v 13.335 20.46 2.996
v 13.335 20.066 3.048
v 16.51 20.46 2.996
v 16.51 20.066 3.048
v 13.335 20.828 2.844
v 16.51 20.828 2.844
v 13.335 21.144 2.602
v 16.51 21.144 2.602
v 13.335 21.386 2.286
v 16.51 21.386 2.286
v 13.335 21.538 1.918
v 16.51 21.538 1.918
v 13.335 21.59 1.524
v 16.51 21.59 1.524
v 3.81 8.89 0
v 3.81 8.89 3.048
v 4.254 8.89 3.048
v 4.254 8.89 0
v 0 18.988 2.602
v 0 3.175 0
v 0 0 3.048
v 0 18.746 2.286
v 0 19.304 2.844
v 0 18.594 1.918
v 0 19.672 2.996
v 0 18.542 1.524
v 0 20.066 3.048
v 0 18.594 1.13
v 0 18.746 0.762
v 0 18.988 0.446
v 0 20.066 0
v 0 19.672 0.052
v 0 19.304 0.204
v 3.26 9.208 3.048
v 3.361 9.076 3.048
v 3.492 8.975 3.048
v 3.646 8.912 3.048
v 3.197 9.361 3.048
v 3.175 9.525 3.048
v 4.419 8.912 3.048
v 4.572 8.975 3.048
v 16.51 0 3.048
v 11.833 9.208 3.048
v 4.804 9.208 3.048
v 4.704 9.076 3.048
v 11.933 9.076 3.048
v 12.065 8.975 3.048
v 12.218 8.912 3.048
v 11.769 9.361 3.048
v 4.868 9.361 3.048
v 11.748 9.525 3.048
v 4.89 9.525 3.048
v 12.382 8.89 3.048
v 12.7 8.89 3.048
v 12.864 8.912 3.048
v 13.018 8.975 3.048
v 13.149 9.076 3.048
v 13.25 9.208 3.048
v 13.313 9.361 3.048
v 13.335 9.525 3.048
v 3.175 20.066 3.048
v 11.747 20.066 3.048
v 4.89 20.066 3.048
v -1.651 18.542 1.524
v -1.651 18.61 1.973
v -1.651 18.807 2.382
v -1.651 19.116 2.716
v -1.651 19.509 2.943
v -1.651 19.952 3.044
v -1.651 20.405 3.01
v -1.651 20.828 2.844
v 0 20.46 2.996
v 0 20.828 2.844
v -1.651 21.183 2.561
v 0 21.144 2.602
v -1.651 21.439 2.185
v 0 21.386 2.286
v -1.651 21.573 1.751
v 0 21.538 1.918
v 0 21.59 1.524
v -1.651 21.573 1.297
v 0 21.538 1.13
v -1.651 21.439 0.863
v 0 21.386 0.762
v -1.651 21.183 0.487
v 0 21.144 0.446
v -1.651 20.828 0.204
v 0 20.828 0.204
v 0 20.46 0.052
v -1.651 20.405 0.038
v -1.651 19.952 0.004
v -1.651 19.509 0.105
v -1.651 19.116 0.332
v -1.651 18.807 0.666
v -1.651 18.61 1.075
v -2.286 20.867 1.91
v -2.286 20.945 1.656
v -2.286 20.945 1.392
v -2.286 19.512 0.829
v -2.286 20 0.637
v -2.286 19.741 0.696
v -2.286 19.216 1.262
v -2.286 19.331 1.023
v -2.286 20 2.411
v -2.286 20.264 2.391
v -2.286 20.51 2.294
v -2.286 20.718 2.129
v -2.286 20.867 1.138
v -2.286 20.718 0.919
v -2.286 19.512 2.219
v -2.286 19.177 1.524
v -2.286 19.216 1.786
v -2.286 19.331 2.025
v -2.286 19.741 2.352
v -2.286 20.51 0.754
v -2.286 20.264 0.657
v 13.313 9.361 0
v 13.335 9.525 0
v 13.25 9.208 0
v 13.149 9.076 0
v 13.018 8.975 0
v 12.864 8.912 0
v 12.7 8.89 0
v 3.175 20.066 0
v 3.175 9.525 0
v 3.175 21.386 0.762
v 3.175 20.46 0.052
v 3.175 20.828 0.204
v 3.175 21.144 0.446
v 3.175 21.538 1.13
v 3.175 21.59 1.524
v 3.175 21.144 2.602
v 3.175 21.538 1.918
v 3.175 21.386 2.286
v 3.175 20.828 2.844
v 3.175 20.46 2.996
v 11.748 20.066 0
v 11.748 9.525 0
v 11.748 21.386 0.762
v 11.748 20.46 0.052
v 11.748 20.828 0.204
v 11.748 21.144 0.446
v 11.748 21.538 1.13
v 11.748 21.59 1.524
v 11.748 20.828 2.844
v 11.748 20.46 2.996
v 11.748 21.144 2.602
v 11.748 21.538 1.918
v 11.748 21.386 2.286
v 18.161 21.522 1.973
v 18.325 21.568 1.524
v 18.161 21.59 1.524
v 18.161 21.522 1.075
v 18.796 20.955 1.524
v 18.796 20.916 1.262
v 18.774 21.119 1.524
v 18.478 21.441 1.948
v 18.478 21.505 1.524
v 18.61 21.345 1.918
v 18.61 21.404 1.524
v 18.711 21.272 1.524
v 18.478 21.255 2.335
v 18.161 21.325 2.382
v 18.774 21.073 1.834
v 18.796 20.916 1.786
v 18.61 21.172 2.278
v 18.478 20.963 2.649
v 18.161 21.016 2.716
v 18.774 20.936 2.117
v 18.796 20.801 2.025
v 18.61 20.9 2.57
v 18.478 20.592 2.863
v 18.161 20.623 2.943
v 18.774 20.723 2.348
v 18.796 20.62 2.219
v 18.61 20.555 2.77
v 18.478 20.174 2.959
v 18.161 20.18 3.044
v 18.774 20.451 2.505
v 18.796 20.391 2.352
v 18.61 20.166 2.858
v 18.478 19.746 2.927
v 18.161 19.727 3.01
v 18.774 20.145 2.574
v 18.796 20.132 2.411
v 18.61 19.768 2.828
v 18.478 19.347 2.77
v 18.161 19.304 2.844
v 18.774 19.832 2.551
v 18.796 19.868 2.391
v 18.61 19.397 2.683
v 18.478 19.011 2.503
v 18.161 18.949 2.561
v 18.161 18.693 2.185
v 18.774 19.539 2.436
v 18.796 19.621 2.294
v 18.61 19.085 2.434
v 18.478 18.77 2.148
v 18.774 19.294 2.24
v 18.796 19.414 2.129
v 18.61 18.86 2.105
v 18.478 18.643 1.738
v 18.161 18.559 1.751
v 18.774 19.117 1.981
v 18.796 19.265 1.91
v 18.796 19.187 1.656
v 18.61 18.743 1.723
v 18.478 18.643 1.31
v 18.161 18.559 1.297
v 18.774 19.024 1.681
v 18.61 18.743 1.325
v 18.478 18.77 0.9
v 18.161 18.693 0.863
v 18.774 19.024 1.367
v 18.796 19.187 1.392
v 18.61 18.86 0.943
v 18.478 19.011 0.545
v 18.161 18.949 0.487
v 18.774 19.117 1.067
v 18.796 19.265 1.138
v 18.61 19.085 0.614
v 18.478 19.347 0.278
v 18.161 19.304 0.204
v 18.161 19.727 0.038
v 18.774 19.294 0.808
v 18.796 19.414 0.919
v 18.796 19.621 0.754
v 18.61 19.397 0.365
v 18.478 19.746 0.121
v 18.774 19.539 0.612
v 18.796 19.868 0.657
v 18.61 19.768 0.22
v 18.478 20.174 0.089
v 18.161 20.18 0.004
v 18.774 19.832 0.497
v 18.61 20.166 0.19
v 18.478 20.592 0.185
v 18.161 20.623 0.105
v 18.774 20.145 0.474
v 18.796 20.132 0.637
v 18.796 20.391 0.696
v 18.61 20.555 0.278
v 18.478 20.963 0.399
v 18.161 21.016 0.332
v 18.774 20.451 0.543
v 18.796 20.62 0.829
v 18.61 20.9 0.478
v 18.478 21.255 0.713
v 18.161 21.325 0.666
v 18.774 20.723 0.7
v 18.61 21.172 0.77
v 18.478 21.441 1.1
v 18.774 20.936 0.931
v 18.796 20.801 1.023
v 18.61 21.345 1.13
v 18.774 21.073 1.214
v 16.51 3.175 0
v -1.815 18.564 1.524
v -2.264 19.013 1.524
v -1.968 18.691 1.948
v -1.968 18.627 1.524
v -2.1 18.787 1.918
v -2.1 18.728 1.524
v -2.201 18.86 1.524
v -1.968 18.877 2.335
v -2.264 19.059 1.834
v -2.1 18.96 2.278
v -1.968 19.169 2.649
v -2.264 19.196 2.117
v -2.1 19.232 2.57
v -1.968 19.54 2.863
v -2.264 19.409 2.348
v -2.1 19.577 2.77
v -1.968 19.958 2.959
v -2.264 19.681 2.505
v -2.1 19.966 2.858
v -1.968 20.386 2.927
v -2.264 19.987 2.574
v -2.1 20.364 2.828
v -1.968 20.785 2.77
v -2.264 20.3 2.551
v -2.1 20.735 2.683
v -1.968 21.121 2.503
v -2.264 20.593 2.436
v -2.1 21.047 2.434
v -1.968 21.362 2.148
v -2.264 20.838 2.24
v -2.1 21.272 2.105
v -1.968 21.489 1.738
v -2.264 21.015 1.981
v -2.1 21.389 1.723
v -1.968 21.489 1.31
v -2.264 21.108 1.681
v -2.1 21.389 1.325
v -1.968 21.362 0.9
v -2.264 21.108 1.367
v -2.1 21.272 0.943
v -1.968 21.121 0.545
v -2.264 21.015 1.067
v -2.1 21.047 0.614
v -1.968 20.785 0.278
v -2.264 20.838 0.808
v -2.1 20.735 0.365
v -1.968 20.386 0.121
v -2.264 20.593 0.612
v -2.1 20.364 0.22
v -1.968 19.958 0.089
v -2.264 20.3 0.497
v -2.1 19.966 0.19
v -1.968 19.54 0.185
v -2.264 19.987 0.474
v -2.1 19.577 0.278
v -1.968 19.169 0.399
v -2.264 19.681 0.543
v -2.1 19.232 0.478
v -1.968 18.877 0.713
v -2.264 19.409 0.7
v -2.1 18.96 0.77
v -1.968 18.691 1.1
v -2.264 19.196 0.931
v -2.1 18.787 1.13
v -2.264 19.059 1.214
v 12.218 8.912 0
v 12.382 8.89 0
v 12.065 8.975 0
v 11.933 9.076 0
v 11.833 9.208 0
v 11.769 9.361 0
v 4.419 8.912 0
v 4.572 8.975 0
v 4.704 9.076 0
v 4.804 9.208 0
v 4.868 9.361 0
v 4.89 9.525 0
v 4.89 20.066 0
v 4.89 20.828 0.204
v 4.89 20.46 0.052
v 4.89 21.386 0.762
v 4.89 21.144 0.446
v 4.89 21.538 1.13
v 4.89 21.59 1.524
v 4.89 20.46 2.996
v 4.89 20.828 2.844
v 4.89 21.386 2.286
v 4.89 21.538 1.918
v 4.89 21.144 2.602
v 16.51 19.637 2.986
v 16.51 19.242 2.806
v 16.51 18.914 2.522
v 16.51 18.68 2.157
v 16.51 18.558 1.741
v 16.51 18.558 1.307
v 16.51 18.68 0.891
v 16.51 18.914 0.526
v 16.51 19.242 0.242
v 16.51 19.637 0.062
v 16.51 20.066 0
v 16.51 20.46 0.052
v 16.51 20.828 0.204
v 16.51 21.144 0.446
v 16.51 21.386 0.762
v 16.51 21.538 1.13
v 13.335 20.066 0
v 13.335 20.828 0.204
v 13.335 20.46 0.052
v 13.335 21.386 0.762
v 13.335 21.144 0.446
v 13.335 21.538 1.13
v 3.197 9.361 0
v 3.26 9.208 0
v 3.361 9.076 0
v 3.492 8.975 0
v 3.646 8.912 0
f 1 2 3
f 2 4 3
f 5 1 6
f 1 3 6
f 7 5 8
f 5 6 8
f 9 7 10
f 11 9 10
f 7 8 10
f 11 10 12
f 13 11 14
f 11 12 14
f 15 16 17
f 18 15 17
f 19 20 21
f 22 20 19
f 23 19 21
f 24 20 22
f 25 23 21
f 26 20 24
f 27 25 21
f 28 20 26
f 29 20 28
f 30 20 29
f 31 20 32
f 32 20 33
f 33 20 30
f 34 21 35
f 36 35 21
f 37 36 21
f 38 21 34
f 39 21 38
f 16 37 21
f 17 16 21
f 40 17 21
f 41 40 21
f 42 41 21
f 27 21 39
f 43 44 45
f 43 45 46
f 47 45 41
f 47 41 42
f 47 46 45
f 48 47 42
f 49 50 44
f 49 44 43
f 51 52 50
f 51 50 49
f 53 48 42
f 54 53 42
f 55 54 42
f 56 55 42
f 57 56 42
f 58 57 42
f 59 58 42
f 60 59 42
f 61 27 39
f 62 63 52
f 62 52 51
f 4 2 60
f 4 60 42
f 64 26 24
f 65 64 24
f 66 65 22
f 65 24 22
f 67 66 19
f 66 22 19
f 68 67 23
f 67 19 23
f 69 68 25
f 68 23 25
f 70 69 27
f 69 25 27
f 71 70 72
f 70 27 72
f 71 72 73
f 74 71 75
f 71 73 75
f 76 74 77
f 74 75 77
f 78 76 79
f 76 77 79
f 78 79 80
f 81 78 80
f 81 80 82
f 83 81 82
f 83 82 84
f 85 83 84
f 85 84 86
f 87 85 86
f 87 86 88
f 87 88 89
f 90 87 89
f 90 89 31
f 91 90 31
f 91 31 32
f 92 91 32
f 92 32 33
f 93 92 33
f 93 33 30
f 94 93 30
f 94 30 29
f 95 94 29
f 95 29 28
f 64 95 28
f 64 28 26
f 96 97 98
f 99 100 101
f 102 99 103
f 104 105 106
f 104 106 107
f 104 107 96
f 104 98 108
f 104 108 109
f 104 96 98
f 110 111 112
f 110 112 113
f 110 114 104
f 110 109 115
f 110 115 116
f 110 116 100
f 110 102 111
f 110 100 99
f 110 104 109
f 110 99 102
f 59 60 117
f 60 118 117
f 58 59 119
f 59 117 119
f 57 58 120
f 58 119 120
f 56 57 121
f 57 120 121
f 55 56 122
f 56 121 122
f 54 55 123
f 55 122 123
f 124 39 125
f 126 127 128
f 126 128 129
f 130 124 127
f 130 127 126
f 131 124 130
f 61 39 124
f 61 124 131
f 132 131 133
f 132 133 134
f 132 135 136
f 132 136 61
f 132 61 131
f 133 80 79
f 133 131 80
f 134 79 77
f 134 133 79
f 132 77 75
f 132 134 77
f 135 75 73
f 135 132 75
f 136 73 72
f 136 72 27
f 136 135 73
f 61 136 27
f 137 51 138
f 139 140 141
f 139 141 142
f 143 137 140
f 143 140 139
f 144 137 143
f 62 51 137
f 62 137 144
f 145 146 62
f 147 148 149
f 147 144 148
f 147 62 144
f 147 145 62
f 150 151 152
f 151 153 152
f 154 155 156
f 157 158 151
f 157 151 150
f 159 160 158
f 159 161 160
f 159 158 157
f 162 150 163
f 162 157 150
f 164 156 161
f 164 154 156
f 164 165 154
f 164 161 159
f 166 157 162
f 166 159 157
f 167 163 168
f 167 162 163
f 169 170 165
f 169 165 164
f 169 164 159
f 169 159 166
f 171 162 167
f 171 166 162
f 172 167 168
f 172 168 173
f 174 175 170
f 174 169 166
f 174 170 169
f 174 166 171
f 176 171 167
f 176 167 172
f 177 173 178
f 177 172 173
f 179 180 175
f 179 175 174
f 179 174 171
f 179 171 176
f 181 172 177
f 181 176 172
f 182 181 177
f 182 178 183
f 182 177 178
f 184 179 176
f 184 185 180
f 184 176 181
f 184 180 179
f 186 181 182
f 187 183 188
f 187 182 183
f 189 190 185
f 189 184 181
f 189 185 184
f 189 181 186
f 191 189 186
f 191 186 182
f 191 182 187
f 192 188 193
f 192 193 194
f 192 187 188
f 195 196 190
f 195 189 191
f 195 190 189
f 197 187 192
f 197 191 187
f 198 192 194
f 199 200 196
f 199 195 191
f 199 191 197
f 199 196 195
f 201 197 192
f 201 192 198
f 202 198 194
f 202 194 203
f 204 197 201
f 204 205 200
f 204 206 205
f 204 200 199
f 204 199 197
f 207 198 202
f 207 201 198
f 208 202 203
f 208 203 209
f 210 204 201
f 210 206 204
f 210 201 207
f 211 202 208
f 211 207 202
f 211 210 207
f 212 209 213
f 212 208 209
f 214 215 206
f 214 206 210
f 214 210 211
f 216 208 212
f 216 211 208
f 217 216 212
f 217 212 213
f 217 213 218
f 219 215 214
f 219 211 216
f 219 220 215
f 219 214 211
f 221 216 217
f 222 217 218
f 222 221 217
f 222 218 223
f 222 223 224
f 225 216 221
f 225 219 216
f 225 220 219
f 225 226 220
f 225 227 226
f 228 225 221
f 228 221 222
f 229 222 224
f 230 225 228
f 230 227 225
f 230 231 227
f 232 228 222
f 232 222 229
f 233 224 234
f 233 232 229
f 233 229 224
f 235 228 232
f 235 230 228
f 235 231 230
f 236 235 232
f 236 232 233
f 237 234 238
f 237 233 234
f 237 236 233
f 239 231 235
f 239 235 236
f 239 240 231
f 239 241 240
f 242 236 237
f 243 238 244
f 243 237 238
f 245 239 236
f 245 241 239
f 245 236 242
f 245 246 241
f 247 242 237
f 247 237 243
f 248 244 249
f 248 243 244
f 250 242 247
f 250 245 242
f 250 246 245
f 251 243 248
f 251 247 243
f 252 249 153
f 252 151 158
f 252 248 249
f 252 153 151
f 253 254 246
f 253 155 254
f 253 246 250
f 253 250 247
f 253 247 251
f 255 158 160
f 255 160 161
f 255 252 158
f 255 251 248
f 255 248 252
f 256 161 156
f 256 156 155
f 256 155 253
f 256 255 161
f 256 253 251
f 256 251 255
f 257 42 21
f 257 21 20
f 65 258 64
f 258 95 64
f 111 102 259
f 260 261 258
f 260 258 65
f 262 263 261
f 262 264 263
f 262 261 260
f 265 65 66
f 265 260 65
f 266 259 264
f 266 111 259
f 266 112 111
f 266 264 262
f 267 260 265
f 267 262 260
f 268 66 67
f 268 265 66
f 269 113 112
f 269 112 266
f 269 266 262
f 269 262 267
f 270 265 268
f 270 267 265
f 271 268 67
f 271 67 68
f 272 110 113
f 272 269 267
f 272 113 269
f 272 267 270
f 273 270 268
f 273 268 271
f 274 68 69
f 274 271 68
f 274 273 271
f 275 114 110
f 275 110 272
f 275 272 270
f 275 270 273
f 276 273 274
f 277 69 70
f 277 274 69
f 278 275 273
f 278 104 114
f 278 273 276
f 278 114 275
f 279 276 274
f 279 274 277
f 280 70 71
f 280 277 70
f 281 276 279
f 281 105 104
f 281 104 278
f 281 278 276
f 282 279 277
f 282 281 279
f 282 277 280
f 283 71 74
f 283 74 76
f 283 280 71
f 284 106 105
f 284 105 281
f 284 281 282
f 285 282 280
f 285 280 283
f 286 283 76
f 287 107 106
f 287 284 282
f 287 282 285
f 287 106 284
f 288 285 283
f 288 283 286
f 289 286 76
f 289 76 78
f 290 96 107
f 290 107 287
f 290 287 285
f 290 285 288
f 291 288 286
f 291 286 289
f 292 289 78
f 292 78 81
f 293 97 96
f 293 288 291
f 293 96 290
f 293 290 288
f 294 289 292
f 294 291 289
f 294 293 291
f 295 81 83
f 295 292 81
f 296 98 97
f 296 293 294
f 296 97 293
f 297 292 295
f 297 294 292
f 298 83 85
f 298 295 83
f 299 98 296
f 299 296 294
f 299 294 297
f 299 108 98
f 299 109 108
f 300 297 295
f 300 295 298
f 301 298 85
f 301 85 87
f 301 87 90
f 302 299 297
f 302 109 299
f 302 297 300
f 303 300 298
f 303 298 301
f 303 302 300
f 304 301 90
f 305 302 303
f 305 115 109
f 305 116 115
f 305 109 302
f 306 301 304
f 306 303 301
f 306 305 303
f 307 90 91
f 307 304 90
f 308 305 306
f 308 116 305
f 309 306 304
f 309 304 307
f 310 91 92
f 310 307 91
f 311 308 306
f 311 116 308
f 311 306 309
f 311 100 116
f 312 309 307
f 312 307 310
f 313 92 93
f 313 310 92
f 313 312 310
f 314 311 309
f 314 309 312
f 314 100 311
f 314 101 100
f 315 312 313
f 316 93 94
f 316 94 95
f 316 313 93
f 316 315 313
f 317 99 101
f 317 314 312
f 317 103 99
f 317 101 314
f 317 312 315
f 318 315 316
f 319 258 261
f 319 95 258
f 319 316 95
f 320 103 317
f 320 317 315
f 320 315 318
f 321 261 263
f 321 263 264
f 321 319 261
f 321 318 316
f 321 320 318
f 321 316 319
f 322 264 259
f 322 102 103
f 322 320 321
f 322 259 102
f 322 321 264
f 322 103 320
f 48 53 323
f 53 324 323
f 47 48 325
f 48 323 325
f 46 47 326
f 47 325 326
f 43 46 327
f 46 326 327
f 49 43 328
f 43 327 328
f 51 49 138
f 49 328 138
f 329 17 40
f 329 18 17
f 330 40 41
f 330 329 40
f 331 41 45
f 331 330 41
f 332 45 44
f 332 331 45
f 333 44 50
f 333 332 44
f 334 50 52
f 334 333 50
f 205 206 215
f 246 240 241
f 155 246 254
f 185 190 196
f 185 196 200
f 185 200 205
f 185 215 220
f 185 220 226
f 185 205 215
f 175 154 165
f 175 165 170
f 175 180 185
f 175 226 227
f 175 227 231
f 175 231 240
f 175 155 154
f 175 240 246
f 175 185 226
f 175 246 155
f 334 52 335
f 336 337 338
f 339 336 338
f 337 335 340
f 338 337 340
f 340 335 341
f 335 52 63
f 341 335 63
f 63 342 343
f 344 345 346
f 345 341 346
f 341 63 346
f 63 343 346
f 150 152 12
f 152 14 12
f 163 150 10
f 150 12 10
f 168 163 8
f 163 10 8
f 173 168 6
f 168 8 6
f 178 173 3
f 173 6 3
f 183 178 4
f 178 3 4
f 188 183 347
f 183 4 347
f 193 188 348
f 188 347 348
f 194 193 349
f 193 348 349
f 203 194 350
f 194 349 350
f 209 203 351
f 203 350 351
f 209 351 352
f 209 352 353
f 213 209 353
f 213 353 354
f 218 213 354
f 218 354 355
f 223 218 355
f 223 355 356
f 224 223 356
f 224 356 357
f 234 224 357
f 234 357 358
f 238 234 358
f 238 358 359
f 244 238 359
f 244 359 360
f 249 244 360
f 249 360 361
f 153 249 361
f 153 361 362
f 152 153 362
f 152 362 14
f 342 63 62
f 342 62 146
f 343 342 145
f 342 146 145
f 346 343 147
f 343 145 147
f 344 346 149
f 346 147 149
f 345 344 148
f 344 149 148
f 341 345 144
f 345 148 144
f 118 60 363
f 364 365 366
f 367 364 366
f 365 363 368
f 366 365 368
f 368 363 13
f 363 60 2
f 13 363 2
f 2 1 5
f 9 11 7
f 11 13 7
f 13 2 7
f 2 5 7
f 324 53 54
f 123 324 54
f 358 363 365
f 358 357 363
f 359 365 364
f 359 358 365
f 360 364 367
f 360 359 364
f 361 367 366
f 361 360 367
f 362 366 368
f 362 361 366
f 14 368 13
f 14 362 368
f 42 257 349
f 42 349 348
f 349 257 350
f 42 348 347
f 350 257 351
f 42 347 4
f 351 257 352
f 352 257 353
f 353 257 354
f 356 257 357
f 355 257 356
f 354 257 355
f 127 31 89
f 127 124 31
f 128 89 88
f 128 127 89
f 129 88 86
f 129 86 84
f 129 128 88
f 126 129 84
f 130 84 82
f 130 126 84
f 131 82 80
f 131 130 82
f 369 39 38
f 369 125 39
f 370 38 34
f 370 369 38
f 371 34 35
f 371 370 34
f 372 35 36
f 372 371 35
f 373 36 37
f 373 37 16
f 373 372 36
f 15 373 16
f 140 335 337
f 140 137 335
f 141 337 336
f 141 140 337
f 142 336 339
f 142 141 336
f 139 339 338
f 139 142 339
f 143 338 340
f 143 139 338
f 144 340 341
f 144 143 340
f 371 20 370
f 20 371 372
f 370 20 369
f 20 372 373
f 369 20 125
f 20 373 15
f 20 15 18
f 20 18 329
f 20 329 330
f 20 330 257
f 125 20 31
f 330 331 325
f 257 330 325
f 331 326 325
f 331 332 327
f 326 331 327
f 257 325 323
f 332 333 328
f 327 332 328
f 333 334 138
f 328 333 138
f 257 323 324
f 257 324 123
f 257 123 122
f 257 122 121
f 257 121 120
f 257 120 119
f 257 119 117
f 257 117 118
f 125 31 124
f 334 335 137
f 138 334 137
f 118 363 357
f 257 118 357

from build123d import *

# Parameters (mm, degrees)
F0_W      = 16.51
F0_H      = 21.59
F1_DEPTH  = 3.048
F2_W      = 1.7145
F2_H      = 12.7
F3_DEPTH  = 25.4
F4_W      = 1.5875
F4_H      = 12.7
F5_DEPTH  = 25.4
F7_DEPTH  = 25.4
F8_R      = 1.52399
F9_R      = 1.524
F10_DEPTH = 2.286
F11_R     = 1.524
F12_DEPTH = 2.286
F13_R     = 0.635
F14_R     = 0.635


# Not quite as in the source:
# - a fillet or chamfer is up to 0.001 mm smaller than in the source, because OpenCascade refuses the exact size


with BuildPart() as f1:
    # F0 (on Top) → F1 (new body)
    with BuildSketch(Plane.XY):
        with Locations((8.255, 10.795)):
            Rectangle(F0_W, F0_H)
    extrude(amount=F1_DEPTH)

    # F2 (on face) → F3 (cut)
    with BuildSketch(Plane.XY.offset(3.048)):
        with Locations((4.03225, 15.24)):
            Rectangle(F2_W, F2_H)
    extrude(amount=-F3_DEPTH, mode=Mode.SUBTRACT)

    # F4 (on face) → F5 (cut)
    with BuildSketch(Plane.XY.offset(3.048)):
        with Locations((12.54125, 15.24)):
            Rectangle(F4_W, F4_H)
    extrude(amount=-F5_DEPTH, mode=Mode.SUBTRACT)

    # F6 (on face) → F7 (cut)
    with BuildSketch(Plane(origin=(0, 0, 0), x_dir=(0, -1, 0), z_dir=(-1, 0, 0))):
        Polygon((0, 0), (0, 3.048), (-3.175, 0), align=None)
    extrude(amount=-F7_DEPTH, mode=Mode.SUBTRACT)

    # F8 (radius 1.524 in the source; OpenCascade refuses exactly that, so slightly less here)
    f8_edges = [f1.edges().sort_by_distance(p)[0] for p in [
        (1.5875, 21.59, 3.048),
        (1.5875, 21.59, 0),
        (8.3185, 21.59, 3.048),
        (8.3185, 21.59, 0),
        (14.9225, 21.59, 3.048),
        (14.9225, 21.59, 0),
    ]]
    fillet(f8_edges, radius=F8_R)

    # F9 (on face) → F10 (join)
    with BuildSketch(Plane(origin=(0, 0, 0), x_dir=(0, -1, 0), z_dir=(-1, 0, 0))):
        with Locations((-20.066, 1.524)):
            Circle(F9_R)
    extrude(amount=F10_DEPTH)

    # F11 (on face) → F12 (join)
    with BuildSketch(Plane.YZ.offset(16.51)):
        with Locations((20.066, 1.524)):
            Circle(F11_R)
    extrude(amount=F12_DEPTH)

    # F13
    f13_edges = [f1.edges().sort_by_distance(p)[0] for p in [
        (18.796, 18.542, 1.524),
        (-2.286, 21.59, 1.524),
    ]]
    fillet(f13_edges, radius=F13_R)

    # F14
    f14_edges = [f1.edges().sort_by_distance(p)[0] for p in [
        (11.7475, 8.89, 1.524),
        (13.335, 8.89, 1.524),
        (3.175, 8.89, 1.524),
        (4.8895, 8.89, 1.524),
    ]]
    fillet(f14_edges, radius=F14_R)


solid = f1.part
